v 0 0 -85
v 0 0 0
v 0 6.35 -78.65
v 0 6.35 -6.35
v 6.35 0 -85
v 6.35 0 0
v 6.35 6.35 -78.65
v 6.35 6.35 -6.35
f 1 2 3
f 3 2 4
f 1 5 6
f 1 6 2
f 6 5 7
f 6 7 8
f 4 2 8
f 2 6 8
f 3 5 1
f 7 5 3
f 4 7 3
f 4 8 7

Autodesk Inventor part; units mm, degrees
ref_plane "YZ Plane" through (0, 0, 0) normal (1, 0, 0) x (0, 1, 0)
ref_plane "XZ Plane" through (0, 0, 0) normal (0, 1, 0) x (-1, 0, 0)
ref_plane "XY Plane" through (0, 0, 0) normal (0, 0, 1) x (1, 0, 0)
sketch "Sketch1" plane through (0, 0, 0) normal (0, 1, 0) x (-1, 0, 0)
  line L0 (0, 0) -> (0, -85)
  line L1 (0, -85) -> (-6.35, -85)
  line L2 (-6.35, -85) -> (-6.35, 0)
  line L3 (-6.35, 0) -> (0, 0)
  dimension "d0" = 85
  dimension "d1" = 6.35
extrude "Extrusion1" add sketch "Sketch1" along normal blind 6.35
sketch "Sketch2" plane through (6.35, 0, 0) normal (1, 0, 0) x (0, 0, -1)
  line L0 (85, 0) -> (0, 0) projected
  line L1 (0, 0) -> (6.35, 6.35)
  line L2 (85, 6.35) -> (0, 6.35) projected
  line L3 (0, 0) -> (8.9803, 0) construction
  line L4 (6.35, 6.35) -> (0, 6.35)
  line L5 (0, 6.35) -> (0, 0)
  dimension "d4" = 45
extrude "Extrusion2" cut sketch "Sketch2" against normal blind 10
sketch "Sketch3" plane through (6.35, 0, -85) normal (1, 0, 0) x (0, 0, -1)
  line L0 (0, 0) -> (-6.35, 6.35)
  line L1 (0, 6.35) -> (-78.65, 6.35) projected
  line L2 (0, 0) -> (8.9803, 0) construction
  line L3 (-6.35, 6.35) -> (0, 6.35)
  line L4 (0, 6.35) -> (0, 0)
  point P0 (-85, 0)
  dimension "d7" = 135
extrude "Extrusion3" cut sketch "Sketch3" against normal blind 10
properties part number "MainAngle"
